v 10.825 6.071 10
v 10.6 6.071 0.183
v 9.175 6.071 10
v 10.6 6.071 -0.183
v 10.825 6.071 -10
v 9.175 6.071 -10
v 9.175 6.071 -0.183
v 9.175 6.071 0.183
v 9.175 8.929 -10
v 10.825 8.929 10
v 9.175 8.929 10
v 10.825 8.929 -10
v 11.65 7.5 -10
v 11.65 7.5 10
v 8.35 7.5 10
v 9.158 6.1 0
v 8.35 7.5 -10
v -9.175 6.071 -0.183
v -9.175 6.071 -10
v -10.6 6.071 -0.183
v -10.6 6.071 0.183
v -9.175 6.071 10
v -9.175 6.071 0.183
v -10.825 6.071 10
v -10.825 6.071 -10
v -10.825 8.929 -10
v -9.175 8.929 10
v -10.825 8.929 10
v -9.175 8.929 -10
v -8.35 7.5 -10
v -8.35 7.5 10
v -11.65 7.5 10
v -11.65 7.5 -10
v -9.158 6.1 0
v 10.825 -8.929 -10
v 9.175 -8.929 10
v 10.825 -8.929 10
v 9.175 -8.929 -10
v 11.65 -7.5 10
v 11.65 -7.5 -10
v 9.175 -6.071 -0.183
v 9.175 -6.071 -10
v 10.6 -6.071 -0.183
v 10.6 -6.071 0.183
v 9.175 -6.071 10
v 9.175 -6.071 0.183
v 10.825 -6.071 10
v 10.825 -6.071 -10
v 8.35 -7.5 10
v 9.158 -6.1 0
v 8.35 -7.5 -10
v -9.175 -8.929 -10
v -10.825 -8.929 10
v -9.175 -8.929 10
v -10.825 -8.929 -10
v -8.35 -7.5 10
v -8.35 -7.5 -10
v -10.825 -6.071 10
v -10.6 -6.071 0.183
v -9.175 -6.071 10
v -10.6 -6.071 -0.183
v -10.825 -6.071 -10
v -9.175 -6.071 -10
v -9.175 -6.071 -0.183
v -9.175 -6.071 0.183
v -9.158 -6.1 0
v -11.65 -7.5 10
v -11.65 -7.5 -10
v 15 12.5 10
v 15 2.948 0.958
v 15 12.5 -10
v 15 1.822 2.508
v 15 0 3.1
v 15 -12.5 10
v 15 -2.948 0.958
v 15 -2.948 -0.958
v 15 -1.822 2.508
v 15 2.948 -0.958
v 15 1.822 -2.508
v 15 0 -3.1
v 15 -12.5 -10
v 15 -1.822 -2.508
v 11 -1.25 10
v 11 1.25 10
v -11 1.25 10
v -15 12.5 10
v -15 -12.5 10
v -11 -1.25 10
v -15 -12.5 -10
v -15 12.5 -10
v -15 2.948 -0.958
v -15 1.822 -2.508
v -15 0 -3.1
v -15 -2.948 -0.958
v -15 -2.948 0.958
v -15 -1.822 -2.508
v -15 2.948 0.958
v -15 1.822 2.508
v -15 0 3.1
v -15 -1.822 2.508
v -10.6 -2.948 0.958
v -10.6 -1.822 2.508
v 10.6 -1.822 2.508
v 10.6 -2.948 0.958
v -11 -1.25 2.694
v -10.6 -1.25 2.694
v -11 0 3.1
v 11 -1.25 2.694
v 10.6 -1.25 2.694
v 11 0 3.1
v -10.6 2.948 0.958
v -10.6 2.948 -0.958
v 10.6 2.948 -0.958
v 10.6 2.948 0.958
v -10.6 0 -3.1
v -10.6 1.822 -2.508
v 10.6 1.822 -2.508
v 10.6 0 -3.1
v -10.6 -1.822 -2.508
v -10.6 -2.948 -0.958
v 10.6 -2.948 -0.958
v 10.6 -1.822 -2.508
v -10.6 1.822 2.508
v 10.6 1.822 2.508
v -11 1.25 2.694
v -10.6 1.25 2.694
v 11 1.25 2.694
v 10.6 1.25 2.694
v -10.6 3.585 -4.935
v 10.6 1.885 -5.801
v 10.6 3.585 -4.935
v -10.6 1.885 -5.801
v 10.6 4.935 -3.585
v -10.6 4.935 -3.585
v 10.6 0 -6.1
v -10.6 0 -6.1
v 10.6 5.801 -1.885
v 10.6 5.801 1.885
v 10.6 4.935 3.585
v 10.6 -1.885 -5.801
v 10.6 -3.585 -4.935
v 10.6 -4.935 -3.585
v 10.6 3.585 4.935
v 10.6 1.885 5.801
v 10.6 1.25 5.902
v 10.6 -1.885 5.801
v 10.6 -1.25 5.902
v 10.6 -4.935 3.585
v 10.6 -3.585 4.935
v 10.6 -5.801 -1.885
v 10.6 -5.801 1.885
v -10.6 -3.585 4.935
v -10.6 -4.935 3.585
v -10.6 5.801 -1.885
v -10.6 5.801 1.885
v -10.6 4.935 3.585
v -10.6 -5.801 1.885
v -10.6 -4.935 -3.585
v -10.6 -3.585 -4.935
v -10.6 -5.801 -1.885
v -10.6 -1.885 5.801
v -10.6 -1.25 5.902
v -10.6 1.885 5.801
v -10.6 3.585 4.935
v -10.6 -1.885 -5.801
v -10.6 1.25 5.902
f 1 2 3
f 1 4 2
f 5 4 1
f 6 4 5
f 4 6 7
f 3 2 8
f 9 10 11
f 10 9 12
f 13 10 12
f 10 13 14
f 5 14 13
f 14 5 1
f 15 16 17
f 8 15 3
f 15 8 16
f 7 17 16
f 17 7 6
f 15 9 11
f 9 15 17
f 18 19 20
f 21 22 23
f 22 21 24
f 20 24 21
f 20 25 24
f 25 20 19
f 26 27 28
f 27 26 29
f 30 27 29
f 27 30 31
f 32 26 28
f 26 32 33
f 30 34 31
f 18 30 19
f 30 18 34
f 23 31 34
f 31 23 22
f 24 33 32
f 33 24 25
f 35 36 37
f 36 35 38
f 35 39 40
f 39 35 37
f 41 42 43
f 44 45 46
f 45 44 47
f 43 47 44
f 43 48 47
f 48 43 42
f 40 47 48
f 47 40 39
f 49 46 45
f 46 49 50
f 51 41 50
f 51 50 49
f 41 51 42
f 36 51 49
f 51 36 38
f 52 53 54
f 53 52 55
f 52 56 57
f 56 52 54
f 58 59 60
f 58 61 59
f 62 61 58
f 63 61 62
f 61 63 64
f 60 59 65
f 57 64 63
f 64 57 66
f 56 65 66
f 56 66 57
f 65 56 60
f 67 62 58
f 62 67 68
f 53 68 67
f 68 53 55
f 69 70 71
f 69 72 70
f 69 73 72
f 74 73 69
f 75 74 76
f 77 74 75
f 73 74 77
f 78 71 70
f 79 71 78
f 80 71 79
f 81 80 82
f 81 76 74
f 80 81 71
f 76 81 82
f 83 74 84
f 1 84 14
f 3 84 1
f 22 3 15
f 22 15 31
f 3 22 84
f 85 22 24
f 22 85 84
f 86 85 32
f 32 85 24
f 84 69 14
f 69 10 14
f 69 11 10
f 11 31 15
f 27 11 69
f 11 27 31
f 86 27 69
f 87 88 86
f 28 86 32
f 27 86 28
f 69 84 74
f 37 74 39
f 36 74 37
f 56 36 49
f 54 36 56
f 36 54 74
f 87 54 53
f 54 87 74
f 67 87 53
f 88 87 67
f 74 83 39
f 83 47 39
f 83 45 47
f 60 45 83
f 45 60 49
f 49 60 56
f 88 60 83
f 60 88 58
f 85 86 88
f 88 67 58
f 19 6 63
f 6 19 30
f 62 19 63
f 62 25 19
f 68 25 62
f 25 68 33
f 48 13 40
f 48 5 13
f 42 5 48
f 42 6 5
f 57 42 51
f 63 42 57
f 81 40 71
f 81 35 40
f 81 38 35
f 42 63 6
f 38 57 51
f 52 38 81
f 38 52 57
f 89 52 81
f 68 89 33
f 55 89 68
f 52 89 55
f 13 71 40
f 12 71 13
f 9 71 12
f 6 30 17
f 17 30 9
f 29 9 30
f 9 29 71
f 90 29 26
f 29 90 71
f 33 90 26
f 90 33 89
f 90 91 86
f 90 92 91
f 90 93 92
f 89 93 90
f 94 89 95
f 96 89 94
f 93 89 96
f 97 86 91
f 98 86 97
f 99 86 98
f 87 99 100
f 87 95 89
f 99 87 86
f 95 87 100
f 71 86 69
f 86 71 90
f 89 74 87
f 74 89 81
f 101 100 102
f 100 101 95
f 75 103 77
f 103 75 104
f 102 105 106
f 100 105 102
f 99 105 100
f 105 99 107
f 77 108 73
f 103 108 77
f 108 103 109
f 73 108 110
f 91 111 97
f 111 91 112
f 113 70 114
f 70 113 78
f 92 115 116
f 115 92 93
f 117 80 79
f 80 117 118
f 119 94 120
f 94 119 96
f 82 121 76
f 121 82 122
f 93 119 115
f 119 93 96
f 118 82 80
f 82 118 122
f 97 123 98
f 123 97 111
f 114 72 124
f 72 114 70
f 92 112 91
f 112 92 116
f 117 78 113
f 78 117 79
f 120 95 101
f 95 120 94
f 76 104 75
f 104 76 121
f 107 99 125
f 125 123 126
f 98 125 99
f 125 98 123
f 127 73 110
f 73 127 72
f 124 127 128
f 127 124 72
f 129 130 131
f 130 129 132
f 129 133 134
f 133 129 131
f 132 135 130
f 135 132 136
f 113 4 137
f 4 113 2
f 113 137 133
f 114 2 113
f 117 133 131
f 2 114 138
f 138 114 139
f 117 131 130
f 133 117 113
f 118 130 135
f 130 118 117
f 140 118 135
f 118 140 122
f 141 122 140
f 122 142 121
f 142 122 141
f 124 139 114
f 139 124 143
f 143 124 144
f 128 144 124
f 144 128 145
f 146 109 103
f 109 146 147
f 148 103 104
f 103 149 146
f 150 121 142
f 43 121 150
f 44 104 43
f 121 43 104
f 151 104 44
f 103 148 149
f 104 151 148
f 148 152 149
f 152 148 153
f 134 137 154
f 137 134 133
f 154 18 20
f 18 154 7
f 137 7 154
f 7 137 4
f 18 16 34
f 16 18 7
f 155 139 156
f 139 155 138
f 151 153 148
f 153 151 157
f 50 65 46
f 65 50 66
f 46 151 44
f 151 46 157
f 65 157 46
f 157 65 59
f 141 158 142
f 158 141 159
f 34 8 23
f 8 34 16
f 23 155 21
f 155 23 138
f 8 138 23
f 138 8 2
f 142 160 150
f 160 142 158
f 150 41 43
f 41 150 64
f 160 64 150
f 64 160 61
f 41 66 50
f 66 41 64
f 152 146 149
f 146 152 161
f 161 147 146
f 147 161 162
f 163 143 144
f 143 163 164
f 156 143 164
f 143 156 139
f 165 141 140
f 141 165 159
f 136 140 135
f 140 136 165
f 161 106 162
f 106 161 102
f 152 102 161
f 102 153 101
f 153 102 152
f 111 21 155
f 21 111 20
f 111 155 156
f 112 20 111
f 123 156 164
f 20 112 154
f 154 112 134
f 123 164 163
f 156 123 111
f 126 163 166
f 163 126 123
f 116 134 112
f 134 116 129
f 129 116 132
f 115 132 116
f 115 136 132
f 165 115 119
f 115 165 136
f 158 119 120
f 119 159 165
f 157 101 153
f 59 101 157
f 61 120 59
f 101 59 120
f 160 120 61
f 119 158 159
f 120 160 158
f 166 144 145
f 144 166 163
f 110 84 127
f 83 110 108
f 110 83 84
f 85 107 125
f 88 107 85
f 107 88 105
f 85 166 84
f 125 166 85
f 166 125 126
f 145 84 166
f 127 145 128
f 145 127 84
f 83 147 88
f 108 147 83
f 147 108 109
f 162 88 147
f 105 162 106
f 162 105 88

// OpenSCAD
// Parameters
shaft_diameter = 6; //[3:12:0.1]
block_length = 30; //[15:60:0.5]
block_width = 25; //[12.5:50:0.5]
block_height = 20; //[10:40:0.5]
shaft_bore_clearance = 0.2; //[0.05:0.6:0.05]
bore_diameter = 6.2; //[6.05:7.5:0.05]
bearing_outer_diameter = 12; //[6:24:0.1]
bearing_length = 19; //[10:38:0.5]
bearing_pocket_diameter_clearance = 0.2; //[0.05:0.6:0.05]
bearing_pocket_diameter = 12.2; //[12.05:14.0:0.05]
bearing_pocket_length = 19.2; //[10:30:0.5]
mounting_hole_count = 4; //[2:6:1]
mounting_screw_diameter = 3; //[2:6:0.1]
mounting_hole_clearance = 0.3; //[0.1:0.8:0.05]
mounting_hole_diameter = 3.3; //[3.0:4.5:0.05]
mounting_hole_edge_margin = 4; //[2:8:0.5]
mounting_hole_spacing_x = 20; //[10:40:0.5]
mounting_hole_spacing_y = 15; //[8:30:0.5]
fillet_radius = 1; //[0:3:0.25]
chamfer = 0.5; //[0:2:0.1]
overlap = 1; //[0.5:2:0.1]
retention_slot_width = 2.5; //[1.5:5:0.1]
retention_slot_length = 22; //[12:30:0.5]

// SCS Bearing Block Hole Positions
module scs_bearing_block_hole_positions() {
  color("Silver") {
    union() {
      translate([mounting_hole_spacing_x/2, mounting_hole_spacing_y/2, 0])
        cylinder(r=mounting_hole_diameter/2, h=block_height + 2*overlap, center=true);
      translate([-mounting_hole_spacing_x/2, mounting_hole_spacing_y/2, 0])
        cylinder(r=mounting_hole_diameter/2, h=block_height + 2*overlap, center=true);
      translate([mounting_hole_spacing_x/2, -mounting_hole_spacing_y/2, 0])
        cylinder(r=mounting_hole_diameter/2, h=block_height + 2*overlap, center=true);
      translate([-mounting_hole_spacing_x/2, -mounting_hole_spacing_y/2, 0])
        cylinder(r=mounting_hole_diameter/2, h=block_height + 2*overlap, center=true);
    }
  }
}

// SBR Bearing Block
module sbr_bearing_block() {
  color("DimGray") {
    difference() {
      cube([block_length, block_width, block_height], center=true);
      translate([0, 0, 0])
        rotate([0, 90, 0])
        cylinder(r=bore_diameter/2, h=block_length + 2*overlap, center=true);
      translate([0, 0, 0])
        rotate([0, 90, 0])
        cylinder(r=bearing_pocket_diameter/2, h=bearing_pocket_length + 2*overlap, center=true);
      scs_bearing_block_hole_positions();
      translate([0, 0, block_height/4 + bore_diameter/4])
        cube([retention_slot_length, retention_slot_width, block_height/2 + bore_diameter/2 + overlap], center=true);
    }
  }
}

// SCS Bearing Block
module scs_bearing_block() {
  color("Black") {
    sbr_bearing_block();
  }
}

// SBR Bearing Block Assembly
module sbr_bearing_block_assembly() {
  color("Silver") {
    scs_bearing_block();
  }
}

// Assembly
module assembly() {
  sbr_bearing_block_assembly();
}

assembly();
